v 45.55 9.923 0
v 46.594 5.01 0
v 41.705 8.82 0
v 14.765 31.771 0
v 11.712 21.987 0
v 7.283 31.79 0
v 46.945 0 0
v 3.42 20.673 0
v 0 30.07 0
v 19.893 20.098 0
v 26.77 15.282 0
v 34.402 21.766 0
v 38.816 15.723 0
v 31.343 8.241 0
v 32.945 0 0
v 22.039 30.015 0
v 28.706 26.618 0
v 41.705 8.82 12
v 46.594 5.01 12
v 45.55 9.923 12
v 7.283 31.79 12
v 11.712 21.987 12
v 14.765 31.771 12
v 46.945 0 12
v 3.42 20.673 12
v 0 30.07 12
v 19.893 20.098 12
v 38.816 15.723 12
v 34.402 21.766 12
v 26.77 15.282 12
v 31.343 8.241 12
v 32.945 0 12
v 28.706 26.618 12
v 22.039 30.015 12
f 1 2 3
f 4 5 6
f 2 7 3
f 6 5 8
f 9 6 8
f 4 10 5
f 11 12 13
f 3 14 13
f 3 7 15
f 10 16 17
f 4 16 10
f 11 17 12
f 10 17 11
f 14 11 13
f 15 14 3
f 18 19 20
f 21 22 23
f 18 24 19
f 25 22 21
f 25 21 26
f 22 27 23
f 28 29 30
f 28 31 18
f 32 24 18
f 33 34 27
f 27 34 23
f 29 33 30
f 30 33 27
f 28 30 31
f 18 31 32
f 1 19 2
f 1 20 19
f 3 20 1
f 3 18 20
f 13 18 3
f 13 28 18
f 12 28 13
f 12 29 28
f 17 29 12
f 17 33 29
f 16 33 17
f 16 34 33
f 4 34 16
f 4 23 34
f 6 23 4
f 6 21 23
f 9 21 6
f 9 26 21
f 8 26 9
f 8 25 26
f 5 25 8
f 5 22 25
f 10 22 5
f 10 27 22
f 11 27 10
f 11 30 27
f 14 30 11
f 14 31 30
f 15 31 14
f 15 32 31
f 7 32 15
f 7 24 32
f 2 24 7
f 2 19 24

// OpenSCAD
$fn = 32;

// ----------------------------------------------------------------------
// Arc stop: segment, 12 mm thick
// ----------------------------------------------------------------------

// --- parameters (mm) ---
profile_height = 12;      // extrusion height
profile_points = 17;      // points of the closed outline

profile = [[46.945, 0], [46.594, 5.01], [45.55, 9.923], [41.705, 8.82], [38.816, 15.723], [34.402, 21.766], [28.706, 26.618], [22.039, 30.015], [14.765, 31.771], [7.283, 31.79], [0, 30.07], [3.42, 20.673], [11.712, 21.987], [19.893, 20.098], [26.77, 15.282], [31.343, 8.241], [32.945, 0]];  // single closed polygon, 17 points, counter clockwise

// --- the one profile operation ---
linear_extrude(height = profile_height) polygon(points = profile);
